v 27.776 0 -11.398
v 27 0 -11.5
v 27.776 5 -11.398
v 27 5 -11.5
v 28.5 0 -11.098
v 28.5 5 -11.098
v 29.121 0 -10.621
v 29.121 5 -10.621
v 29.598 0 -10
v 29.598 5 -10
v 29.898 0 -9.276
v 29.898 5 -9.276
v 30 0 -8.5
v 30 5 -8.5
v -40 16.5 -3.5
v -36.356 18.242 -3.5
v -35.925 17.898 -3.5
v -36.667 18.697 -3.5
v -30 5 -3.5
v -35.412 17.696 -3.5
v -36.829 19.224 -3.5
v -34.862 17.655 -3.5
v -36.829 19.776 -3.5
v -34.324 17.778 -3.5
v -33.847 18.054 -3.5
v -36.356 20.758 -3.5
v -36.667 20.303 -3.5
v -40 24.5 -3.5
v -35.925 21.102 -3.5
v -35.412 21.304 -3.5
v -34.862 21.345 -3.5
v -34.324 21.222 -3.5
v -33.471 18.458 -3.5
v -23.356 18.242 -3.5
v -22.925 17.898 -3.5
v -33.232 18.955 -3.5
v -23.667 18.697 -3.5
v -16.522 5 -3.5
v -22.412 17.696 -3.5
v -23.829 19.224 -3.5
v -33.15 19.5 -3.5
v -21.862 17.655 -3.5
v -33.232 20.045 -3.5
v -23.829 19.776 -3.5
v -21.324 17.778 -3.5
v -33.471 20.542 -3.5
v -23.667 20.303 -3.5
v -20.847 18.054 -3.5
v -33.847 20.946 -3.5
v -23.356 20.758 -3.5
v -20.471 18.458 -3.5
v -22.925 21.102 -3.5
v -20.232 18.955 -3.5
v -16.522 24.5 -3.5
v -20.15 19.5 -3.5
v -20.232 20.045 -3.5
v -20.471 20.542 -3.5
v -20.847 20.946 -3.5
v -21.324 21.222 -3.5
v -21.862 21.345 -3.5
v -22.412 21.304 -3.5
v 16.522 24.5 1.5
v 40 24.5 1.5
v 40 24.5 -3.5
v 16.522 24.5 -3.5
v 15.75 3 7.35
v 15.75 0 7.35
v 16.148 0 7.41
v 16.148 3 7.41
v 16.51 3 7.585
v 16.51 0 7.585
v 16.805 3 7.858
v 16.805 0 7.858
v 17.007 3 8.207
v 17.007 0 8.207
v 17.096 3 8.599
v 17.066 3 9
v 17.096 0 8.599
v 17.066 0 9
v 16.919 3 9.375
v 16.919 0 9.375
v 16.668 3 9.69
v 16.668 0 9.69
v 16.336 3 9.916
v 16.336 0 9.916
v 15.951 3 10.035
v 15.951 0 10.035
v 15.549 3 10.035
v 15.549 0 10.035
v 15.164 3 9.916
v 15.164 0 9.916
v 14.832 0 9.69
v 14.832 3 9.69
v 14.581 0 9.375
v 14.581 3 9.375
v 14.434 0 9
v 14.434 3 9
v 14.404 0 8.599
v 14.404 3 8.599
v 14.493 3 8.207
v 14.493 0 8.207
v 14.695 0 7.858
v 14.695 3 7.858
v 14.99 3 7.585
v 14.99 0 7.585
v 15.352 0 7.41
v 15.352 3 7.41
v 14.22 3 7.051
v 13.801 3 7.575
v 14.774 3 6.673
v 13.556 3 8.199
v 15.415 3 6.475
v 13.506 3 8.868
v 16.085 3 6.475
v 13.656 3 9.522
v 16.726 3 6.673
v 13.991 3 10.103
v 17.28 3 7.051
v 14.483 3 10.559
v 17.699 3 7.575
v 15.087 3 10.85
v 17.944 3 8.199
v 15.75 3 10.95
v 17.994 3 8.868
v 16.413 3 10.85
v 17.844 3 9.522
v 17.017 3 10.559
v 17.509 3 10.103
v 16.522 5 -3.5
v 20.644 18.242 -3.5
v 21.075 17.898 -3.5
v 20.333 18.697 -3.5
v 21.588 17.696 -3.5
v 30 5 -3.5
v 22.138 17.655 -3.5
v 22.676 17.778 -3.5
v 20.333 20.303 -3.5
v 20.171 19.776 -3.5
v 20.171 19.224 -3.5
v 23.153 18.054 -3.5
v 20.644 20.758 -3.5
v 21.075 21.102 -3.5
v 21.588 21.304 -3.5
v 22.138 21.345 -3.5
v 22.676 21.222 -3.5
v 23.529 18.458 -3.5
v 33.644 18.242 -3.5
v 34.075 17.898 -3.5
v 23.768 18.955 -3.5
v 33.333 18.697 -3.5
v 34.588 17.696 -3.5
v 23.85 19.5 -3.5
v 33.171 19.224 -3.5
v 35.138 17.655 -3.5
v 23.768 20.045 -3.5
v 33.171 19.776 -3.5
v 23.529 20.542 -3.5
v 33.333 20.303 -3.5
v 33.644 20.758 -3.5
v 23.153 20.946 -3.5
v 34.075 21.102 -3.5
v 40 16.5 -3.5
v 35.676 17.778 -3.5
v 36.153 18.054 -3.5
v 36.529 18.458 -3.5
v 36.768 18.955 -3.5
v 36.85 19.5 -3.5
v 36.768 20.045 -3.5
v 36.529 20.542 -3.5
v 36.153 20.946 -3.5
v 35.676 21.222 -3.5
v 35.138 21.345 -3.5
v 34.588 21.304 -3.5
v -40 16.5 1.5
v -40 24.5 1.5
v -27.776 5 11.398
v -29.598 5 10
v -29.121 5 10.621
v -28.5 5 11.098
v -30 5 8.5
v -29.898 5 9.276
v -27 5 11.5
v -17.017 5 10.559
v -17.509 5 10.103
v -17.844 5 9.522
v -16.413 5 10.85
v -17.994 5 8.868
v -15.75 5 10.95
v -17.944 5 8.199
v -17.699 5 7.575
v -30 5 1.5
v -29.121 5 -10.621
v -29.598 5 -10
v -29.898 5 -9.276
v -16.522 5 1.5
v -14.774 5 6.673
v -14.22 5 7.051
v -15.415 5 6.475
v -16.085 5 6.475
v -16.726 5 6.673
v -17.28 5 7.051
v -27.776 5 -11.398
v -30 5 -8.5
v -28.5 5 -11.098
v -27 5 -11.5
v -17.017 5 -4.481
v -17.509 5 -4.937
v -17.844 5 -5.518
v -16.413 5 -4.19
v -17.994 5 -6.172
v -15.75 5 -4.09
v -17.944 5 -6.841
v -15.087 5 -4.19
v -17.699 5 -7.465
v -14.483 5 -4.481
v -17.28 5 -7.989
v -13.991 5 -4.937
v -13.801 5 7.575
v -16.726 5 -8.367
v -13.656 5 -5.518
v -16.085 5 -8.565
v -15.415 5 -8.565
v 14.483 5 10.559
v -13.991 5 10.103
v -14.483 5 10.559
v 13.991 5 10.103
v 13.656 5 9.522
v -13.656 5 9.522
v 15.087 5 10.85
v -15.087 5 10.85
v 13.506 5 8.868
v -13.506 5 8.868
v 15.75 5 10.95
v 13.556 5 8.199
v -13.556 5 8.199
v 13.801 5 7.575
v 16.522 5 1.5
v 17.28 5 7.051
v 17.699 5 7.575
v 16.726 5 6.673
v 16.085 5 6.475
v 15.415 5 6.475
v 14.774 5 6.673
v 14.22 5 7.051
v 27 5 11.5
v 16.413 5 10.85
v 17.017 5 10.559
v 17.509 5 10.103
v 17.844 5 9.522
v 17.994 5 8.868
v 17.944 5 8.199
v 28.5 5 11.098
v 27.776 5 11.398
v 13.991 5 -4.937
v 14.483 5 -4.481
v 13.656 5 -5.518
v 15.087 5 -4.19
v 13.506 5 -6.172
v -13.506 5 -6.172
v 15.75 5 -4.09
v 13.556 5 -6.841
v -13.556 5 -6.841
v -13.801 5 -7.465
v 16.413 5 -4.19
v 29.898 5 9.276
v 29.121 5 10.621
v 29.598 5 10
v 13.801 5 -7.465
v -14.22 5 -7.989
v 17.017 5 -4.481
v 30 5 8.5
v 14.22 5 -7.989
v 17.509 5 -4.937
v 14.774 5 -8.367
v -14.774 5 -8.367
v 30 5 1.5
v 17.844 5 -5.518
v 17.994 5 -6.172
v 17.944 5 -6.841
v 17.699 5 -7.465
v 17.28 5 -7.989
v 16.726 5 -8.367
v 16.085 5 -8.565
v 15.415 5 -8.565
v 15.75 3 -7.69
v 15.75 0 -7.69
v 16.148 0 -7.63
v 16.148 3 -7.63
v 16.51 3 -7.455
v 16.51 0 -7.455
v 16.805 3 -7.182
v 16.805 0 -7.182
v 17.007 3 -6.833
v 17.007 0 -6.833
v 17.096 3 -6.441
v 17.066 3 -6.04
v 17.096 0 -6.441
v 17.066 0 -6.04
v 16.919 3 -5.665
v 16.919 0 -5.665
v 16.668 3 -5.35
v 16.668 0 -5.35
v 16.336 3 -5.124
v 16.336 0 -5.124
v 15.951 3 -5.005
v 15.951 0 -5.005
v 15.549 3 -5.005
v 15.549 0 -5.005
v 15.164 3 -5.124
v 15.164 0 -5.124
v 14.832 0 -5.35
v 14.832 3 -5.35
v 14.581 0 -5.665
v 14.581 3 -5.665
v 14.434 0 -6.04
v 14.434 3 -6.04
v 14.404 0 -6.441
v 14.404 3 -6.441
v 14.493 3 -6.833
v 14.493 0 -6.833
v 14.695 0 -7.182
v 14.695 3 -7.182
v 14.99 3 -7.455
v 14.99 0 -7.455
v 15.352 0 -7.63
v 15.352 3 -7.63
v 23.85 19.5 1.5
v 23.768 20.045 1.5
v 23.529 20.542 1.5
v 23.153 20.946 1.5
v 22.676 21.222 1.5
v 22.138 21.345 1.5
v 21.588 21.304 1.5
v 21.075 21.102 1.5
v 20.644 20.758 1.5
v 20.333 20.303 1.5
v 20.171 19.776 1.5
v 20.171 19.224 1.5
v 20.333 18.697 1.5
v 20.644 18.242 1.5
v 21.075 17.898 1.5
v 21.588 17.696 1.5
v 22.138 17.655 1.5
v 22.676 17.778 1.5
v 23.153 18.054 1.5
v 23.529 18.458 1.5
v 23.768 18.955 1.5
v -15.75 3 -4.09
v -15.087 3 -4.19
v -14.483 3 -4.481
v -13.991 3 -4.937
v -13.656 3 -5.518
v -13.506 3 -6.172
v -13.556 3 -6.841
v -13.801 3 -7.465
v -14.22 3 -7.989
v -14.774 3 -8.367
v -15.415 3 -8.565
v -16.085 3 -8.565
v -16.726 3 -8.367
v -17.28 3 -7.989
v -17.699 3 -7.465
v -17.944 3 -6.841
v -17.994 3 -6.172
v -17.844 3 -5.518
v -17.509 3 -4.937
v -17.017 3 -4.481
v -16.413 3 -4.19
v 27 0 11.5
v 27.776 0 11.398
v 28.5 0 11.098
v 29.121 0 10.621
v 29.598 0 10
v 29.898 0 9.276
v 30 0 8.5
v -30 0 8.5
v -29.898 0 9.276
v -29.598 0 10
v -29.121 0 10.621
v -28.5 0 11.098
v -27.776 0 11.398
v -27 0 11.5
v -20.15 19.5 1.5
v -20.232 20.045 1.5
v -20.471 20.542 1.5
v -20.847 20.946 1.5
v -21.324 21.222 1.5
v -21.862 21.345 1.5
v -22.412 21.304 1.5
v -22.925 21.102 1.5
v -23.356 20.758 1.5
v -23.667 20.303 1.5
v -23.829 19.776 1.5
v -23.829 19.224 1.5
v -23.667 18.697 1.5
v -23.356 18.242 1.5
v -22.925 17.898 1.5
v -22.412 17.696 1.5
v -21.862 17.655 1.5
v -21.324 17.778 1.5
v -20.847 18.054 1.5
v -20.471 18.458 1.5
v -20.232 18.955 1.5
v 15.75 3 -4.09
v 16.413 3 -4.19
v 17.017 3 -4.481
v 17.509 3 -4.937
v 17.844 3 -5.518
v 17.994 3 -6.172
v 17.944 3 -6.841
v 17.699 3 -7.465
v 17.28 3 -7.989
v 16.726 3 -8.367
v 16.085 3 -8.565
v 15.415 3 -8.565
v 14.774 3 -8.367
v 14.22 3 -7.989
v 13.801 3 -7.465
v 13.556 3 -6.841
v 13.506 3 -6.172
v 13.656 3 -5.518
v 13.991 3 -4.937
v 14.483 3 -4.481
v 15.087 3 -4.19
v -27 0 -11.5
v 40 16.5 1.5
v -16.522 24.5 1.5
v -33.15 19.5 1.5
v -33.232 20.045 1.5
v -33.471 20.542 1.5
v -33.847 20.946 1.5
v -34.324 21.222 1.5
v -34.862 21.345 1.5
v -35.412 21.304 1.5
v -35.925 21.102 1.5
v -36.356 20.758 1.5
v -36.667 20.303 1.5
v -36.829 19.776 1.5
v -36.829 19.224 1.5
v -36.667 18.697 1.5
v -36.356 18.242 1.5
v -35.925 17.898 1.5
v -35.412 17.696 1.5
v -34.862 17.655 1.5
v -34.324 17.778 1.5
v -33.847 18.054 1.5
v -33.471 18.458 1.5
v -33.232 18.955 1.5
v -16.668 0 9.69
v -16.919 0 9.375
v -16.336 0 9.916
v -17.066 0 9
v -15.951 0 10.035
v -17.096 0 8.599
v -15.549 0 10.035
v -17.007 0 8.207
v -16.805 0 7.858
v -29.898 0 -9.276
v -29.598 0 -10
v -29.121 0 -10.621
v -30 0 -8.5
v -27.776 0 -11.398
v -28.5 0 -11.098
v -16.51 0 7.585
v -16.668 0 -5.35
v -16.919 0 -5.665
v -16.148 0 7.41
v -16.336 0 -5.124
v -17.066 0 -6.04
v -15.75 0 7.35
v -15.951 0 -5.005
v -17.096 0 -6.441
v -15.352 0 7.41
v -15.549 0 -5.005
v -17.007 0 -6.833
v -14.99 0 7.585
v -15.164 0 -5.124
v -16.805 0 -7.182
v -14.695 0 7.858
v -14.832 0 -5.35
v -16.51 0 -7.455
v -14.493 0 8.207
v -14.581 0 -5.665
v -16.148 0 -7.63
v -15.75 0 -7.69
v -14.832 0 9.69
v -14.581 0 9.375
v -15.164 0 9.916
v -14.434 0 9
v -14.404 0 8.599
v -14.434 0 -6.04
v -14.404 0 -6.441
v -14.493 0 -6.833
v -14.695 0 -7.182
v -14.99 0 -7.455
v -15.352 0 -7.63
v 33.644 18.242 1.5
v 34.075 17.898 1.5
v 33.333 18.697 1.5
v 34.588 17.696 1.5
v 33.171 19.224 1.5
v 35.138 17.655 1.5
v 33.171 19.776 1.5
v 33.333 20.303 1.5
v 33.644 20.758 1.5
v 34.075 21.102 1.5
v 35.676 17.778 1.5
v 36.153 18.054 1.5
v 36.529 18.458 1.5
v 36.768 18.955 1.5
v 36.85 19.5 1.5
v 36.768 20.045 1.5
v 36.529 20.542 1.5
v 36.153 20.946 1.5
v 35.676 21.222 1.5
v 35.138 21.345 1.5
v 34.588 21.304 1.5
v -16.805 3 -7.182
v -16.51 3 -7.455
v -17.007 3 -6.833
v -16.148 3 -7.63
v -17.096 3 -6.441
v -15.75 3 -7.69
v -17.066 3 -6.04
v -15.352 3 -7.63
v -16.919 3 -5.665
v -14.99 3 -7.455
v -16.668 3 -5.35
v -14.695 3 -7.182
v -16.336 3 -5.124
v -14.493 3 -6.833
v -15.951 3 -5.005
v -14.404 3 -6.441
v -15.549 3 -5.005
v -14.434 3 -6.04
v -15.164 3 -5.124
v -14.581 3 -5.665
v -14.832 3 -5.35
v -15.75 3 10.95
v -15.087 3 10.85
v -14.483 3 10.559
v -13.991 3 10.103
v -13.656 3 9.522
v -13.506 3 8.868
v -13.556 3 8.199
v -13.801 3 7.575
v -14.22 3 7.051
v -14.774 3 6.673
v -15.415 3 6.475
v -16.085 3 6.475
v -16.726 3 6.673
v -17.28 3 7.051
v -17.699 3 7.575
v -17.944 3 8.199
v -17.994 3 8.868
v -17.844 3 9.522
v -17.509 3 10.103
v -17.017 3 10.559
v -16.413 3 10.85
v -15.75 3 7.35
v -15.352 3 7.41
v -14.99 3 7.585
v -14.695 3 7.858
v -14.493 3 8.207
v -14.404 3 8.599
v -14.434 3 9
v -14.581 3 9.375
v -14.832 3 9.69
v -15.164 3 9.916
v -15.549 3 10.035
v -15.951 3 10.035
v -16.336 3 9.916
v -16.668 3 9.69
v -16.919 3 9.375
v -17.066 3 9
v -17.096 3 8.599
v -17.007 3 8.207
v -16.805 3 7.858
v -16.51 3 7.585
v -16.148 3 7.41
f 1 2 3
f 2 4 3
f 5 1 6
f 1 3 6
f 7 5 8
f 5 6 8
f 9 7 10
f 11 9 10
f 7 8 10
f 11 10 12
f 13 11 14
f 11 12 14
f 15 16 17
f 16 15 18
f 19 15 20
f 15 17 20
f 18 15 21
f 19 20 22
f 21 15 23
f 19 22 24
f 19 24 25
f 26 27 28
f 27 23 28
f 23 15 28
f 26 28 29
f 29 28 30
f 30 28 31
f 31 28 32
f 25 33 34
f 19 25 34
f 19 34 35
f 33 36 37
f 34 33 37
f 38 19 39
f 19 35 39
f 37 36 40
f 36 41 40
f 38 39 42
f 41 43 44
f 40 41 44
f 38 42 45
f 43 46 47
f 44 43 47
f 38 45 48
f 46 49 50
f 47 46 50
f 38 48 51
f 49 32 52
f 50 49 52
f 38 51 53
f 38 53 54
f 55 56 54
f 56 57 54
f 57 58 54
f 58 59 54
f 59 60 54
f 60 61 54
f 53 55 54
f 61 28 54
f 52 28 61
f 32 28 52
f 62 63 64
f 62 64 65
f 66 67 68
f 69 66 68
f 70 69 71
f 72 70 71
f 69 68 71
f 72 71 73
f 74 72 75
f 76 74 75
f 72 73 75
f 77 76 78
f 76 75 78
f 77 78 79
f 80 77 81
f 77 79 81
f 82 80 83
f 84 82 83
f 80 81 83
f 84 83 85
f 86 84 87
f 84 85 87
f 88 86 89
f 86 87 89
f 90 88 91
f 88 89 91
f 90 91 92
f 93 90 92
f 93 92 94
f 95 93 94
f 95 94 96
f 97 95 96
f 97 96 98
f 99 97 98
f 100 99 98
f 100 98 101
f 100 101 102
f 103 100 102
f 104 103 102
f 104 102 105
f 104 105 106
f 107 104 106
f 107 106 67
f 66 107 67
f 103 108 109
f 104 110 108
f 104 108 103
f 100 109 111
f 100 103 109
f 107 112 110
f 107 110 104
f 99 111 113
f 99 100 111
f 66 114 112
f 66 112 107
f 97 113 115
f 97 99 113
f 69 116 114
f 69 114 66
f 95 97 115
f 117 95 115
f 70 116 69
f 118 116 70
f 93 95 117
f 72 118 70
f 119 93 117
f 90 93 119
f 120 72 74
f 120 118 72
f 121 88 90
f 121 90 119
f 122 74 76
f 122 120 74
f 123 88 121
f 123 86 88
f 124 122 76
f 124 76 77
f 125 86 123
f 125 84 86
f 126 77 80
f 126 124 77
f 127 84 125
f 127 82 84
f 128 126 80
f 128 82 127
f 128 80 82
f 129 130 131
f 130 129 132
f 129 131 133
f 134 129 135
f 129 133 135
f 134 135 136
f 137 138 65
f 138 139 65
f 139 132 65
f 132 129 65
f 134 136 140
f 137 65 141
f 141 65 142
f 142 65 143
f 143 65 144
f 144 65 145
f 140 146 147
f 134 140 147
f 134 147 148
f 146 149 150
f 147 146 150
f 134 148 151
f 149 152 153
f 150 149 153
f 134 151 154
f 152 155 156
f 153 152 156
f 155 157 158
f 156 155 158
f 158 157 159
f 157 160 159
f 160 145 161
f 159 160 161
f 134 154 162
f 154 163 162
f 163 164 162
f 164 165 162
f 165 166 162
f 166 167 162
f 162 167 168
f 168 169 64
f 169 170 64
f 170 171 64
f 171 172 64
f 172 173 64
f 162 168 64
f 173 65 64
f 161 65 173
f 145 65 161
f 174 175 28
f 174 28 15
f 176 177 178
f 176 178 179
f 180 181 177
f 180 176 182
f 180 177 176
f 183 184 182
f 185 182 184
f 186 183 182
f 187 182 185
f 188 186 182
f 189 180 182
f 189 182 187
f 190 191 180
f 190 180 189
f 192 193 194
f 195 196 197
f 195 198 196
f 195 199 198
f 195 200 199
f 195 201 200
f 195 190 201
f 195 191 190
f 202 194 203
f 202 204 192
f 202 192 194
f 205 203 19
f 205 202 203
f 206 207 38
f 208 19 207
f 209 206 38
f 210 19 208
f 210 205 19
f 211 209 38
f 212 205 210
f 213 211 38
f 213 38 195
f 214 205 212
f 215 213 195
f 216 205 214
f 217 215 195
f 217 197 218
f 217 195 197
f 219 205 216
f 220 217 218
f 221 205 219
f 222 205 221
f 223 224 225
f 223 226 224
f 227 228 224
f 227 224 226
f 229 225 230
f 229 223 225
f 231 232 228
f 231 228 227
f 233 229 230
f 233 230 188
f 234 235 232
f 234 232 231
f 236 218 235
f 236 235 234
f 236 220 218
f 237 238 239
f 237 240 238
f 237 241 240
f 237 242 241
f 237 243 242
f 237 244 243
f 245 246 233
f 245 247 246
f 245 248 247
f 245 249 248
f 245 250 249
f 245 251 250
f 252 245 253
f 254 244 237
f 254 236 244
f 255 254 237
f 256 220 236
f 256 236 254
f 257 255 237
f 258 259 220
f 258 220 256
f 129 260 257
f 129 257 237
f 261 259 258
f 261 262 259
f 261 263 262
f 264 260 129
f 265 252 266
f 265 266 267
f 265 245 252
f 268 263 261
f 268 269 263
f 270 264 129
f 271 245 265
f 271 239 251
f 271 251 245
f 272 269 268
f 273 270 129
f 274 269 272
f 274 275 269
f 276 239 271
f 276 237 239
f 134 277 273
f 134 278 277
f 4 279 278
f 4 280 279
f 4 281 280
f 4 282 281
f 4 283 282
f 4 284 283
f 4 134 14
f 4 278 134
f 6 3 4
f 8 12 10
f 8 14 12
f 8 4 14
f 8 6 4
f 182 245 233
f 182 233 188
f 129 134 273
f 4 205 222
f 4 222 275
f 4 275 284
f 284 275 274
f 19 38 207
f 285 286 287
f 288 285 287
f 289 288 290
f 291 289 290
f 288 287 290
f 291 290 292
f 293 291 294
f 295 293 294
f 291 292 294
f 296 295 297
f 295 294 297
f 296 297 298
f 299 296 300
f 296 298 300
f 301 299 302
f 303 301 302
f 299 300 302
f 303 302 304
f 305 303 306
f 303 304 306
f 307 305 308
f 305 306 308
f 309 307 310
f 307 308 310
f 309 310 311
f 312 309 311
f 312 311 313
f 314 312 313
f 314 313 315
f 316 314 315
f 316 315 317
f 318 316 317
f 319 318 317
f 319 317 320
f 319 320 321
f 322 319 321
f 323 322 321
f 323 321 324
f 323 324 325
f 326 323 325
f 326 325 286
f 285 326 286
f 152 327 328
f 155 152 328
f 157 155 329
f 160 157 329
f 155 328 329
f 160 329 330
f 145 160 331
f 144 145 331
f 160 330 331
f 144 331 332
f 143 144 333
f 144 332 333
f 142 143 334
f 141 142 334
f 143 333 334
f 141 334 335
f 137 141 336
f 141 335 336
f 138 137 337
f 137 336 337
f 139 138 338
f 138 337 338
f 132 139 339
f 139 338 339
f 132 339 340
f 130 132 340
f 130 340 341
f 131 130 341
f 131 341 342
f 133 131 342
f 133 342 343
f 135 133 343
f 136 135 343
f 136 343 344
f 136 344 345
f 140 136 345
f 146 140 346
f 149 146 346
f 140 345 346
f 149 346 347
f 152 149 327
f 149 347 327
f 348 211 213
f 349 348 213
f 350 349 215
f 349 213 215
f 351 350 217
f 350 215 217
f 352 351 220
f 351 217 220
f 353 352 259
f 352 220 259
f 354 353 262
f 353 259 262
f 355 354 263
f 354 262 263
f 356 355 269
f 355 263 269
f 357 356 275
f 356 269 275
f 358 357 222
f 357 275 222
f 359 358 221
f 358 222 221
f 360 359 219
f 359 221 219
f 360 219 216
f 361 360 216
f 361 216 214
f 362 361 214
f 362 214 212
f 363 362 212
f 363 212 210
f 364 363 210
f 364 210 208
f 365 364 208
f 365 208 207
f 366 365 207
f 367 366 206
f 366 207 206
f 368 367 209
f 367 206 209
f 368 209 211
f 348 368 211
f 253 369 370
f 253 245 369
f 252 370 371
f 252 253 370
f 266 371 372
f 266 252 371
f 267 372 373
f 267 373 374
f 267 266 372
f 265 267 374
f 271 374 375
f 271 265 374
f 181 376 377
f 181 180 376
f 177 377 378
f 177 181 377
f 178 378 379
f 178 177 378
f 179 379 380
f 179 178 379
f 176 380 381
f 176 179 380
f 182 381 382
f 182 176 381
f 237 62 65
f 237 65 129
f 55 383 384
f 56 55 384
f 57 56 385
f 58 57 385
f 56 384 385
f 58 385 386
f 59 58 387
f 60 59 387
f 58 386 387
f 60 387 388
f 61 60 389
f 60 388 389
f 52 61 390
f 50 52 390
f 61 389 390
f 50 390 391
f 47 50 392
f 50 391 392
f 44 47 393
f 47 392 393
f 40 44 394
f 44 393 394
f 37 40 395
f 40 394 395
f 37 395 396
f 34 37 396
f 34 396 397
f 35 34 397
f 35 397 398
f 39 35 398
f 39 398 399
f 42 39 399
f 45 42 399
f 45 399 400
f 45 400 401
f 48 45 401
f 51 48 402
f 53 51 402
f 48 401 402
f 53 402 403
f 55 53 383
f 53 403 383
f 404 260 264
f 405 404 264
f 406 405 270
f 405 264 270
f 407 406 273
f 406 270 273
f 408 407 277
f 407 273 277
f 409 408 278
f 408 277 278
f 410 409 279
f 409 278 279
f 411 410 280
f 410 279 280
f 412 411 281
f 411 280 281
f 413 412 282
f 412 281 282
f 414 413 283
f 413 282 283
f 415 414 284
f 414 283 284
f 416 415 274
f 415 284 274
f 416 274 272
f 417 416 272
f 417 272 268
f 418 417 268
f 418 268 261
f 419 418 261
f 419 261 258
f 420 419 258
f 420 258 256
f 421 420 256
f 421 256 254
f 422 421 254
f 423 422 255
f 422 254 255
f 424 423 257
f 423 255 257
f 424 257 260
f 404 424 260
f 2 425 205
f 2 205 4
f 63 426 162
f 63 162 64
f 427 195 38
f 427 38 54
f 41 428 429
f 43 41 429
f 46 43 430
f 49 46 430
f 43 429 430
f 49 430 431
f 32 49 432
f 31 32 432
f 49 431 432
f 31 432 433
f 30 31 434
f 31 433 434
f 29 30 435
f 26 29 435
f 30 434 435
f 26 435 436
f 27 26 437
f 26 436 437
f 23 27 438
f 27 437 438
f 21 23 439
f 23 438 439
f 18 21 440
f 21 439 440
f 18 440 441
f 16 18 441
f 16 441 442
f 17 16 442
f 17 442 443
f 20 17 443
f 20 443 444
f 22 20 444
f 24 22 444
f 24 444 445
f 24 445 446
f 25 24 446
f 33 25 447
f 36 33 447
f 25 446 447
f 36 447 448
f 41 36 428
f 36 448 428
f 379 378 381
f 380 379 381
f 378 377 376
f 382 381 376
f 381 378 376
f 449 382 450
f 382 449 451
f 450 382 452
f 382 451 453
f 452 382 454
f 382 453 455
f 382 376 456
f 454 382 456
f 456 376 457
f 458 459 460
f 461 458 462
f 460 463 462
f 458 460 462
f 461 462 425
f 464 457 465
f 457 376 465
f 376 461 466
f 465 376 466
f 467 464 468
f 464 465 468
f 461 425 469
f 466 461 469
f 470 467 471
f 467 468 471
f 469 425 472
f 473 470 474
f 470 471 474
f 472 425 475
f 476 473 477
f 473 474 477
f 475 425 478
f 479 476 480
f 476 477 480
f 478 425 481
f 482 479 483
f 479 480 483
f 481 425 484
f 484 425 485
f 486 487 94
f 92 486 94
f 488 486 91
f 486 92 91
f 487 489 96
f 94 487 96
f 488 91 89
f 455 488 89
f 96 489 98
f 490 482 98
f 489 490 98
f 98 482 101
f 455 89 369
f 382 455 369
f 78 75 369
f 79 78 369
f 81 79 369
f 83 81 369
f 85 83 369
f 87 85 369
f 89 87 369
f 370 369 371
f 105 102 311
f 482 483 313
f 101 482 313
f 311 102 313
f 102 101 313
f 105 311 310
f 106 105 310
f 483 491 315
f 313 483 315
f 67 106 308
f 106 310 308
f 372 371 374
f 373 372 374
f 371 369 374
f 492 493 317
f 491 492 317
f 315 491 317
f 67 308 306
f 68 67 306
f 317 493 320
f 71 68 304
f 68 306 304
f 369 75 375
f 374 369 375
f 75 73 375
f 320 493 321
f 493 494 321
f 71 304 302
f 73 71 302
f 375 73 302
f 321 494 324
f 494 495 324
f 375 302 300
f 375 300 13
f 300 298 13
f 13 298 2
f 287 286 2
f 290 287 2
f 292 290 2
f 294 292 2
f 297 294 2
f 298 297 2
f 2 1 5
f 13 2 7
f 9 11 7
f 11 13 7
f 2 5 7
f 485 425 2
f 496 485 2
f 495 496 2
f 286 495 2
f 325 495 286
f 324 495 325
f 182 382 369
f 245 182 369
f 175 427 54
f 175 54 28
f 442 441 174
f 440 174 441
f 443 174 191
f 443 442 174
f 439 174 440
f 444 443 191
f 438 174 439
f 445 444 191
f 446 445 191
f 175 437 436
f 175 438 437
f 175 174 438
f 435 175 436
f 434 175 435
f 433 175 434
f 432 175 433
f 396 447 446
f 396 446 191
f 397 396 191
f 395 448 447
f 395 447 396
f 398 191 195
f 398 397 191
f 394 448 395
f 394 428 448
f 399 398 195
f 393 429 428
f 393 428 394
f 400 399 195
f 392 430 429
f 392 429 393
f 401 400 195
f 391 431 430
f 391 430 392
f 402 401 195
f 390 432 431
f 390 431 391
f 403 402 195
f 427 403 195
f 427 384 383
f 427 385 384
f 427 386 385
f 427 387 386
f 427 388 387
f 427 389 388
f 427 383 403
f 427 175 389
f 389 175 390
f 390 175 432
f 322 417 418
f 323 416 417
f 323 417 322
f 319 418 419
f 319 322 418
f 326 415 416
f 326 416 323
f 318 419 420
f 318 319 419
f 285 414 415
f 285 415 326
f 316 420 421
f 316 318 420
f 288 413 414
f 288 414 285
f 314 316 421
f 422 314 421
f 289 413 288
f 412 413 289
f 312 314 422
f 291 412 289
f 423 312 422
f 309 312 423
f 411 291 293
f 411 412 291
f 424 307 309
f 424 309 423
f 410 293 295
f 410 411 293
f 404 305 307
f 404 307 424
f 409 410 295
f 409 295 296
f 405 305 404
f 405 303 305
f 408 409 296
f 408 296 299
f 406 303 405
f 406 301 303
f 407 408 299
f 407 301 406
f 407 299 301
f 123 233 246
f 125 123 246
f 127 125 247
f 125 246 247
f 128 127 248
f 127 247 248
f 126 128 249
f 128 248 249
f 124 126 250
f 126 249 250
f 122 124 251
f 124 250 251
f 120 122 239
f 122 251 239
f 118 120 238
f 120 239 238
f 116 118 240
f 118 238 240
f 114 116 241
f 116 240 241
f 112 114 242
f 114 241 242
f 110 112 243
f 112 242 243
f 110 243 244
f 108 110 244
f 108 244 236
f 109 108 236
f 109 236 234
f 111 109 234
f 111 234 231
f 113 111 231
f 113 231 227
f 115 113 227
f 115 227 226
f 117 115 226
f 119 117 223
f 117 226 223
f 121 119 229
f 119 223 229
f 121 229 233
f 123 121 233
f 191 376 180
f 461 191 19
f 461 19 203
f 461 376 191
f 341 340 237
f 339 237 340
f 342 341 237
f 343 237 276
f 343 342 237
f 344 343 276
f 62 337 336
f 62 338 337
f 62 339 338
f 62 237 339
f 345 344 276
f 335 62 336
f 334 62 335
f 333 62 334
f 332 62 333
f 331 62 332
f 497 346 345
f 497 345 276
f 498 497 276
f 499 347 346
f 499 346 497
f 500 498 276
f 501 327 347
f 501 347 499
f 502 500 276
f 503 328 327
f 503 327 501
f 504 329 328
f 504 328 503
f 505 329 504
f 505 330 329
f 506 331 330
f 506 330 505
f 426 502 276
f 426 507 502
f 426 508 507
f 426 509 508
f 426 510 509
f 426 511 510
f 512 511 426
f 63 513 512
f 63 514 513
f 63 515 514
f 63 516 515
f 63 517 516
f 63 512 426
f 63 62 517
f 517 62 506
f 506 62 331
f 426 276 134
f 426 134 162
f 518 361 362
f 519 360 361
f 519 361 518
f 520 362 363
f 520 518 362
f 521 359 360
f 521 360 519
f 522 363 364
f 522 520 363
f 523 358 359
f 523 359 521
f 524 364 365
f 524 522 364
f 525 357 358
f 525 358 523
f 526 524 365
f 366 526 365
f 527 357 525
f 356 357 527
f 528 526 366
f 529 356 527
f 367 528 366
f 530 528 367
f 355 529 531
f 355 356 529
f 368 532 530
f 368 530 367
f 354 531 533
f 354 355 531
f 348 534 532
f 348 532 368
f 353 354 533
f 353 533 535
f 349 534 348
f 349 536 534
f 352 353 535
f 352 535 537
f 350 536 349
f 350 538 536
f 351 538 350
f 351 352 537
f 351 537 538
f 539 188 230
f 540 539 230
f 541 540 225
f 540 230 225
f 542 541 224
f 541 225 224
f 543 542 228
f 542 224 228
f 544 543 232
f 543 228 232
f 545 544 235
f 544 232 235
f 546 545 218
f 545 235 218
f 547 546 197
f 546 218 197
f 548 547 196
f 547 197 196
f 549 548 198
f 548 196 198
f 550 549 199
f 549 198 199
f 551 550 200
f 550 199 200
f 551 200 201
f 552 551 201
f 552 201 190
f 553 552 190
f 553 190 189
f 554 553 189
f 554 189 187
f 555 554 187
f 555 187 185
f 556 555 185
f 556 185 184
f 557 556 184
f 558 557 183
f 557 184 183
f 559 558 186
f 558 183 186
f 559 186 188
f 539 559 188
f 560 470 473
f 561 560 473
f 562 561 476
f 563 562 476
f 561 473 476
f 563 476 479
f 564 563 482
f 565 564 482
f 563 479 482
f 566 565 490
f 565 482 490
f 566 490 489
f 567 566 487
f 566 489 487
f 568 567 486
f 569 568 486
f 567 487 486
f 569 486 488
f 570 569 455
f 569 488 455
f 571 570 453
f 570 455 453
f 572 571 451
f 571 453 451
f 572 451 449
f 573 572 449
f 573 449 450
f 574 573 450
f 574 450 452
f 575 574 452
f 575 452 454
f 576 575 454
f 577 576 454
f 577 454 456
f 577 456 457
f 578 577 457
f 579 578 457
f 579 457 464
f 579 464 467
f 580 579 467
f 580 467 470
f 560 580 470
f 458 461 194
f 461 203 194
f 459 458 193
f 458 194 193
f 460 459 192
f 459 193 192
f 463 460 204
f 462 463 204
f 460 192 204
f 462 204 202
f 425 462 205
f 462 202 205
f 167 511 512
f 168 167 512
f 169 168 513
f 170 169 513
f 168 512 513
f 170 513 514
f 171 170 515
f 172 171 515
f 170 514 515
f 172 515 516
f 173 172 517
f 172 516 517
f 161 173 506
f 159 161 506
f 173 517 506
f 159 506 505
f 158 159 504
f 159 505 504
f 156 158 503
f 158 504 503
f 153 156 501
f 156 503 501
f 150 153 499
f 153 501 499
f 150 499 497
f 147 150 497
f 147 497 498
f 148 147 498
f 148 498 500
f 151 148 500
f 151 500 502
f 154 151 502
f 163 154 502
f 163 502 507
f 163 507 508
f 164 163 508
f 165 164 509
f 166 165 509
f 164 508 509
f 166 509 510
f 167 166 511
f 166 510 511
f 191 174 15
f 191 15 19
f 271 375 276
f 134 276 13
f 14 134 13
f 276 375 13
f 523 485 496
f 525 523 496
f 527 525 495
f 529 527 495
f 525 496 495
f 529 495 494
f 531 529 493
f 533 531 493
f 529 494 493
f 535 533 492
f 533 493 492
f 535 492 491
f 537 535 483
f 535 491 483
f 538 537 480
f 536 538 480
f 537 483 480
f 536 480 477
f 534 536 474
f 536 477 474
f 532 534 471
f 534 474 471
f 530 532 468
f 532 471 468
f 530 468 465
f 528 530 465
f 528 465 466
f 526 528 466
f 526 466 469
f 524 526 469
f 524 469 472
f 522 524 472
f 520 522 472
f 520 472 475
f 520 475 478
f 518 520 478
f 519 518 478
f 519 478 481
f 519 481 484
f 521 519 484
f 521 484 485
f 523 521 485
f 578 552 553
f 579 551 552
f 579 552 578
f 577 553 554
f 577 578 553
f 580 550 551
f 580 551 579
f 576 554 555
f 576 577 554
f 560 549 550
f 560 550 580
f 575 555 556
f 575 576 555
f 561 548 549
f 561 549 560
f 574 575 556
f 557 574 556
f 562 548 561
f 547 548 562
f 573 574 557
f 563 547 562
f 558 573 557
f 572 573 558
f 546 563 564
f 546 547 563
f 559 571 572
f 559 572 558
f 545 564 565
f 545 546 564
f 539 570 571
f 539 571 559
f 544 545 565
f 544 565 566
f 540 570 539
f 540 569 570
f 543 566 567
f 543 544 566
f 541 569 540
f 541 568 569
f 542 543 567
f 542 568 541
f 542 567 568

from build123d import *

# Parameters (mm, degrees)
SKETCH1_W           = 60
SKETCH1_H           = 23
BOSS_EXTRUDE1_DEPTH = 5
BOSS_EXTRUDE2_START = -10
SKETCH2_R           = 1.85
BOSS_EXTRUDE2_DEPTH = 5
SKETCH3_R           = 1.35
CUT_EXTRUDE1_DEPTH  = 49.295962564
SKETCH4_R           = 2.25
CUT_EXTRUDE2_DEPTH  = 2
FILLET1_R           = 3


with BuildPart() as part:
    # Sketch1 → Boss-Extrude1 (new body)
    with BuildSketch(Plane(origin=(0, 0, 0), x_dir=(1, 0, 0), z_dir=(0, 1, 0))):
        Rectangle(SKETCH1_W, SKETCH1_H)
    extrude(amount=BOSS_EXTRUDE1_DEPTH)

    # Sketch2 → Boss-Extrude2 (add)
    # profile 1 of 2: a face of its own
    with BuildSketch(Plane.XY.offset(11.5).offset(BOSS_EXTRUDE2_START)):
        Polygon((-40, 24.5), (-40, 16.5), (-30, 5), (-16.521636852, 5), (-16.521636852, 24.5), align=None)
        with Locations((-35, 19.5)):
            Circle(SKETCH2_R, mode=Mode.SUBTRACT)
        with Locations((-22, 19.5)):
            Circle(SKETCH2_R, mode=Mode.SUBTRACT)
    # profile 2 of 2: a face of its own
    with BuildSketch(Plane.XY.offset(11.5).offset(BOSS_EXTRUDE2_START)):
        Polygon((16.521636852, 24.5), (16.521636852, 5), (30, 5), (40, 16.5), (40, 24.5), align=None)
        with Locations((22, 19.5)):
            Circle(SKETCH2_R, mode=Mode.SUBTRACT)
        with Locations((35, 19.5)):
            Circle(SKETCH2_R, mode=Mode.SUBTRACT)
    extrude(amount=-BOSS_EXTRUDE2_DEPTH)

    # Sketch3 → Cut-Extrude1 (cut, through all)
    with BuildSketch(Plane.XZ):
        with Locations((-15.75, 8.7)):
            Circle(SKETCH3_R)
        with Locations((15.75, 8.7)):
            Circle(SKETCH3_R)
        with Locations((15.75, -6.34)):
            Circle(SKETCH3_R)
        with Locations((-15.75, -6.34)):
            Circle(SKETCH3_R)
    extrude(amount=-CUT_EXTRUDE1_DEPTH, mode=Mode.SUBTRACT)

    # Sketch4 → Cut-Extrude2 (cut)
    with BuildSketch(Plane(origin=(0, 5, 0), x_dir=(1, 0, 0), z_dir=(0, 1, 0))):
        with Locations((-15.75, 6.34)):
            Circle(SKETCH4_R)
        with Locations((15.75, 6.34)):
            Circle(SKETCH4_R)
        with Locations((15.75, -8.7)):
            Circle(SKETCH4_R)
        with Locations((-15.75, -8.7)):
            Circle(SKETCH4_R)
    extrude(amount=-CUT_EXTRUDE2_DEPTH, mode=Mode.SUBTRACT)

    # Fillet1
    fillet1_edges = [part.edges().sort_by_distance(p)[0] for p in [
        (30, 2.5, -11.5),
        (-30, 2.5, -11.5),
        (-30, 2.5, 11.5),
        (30, 2.5, 11.5),
    ]]
    fillet(fillet1_edges, radius=FILLET1_R)


solid = part.part
